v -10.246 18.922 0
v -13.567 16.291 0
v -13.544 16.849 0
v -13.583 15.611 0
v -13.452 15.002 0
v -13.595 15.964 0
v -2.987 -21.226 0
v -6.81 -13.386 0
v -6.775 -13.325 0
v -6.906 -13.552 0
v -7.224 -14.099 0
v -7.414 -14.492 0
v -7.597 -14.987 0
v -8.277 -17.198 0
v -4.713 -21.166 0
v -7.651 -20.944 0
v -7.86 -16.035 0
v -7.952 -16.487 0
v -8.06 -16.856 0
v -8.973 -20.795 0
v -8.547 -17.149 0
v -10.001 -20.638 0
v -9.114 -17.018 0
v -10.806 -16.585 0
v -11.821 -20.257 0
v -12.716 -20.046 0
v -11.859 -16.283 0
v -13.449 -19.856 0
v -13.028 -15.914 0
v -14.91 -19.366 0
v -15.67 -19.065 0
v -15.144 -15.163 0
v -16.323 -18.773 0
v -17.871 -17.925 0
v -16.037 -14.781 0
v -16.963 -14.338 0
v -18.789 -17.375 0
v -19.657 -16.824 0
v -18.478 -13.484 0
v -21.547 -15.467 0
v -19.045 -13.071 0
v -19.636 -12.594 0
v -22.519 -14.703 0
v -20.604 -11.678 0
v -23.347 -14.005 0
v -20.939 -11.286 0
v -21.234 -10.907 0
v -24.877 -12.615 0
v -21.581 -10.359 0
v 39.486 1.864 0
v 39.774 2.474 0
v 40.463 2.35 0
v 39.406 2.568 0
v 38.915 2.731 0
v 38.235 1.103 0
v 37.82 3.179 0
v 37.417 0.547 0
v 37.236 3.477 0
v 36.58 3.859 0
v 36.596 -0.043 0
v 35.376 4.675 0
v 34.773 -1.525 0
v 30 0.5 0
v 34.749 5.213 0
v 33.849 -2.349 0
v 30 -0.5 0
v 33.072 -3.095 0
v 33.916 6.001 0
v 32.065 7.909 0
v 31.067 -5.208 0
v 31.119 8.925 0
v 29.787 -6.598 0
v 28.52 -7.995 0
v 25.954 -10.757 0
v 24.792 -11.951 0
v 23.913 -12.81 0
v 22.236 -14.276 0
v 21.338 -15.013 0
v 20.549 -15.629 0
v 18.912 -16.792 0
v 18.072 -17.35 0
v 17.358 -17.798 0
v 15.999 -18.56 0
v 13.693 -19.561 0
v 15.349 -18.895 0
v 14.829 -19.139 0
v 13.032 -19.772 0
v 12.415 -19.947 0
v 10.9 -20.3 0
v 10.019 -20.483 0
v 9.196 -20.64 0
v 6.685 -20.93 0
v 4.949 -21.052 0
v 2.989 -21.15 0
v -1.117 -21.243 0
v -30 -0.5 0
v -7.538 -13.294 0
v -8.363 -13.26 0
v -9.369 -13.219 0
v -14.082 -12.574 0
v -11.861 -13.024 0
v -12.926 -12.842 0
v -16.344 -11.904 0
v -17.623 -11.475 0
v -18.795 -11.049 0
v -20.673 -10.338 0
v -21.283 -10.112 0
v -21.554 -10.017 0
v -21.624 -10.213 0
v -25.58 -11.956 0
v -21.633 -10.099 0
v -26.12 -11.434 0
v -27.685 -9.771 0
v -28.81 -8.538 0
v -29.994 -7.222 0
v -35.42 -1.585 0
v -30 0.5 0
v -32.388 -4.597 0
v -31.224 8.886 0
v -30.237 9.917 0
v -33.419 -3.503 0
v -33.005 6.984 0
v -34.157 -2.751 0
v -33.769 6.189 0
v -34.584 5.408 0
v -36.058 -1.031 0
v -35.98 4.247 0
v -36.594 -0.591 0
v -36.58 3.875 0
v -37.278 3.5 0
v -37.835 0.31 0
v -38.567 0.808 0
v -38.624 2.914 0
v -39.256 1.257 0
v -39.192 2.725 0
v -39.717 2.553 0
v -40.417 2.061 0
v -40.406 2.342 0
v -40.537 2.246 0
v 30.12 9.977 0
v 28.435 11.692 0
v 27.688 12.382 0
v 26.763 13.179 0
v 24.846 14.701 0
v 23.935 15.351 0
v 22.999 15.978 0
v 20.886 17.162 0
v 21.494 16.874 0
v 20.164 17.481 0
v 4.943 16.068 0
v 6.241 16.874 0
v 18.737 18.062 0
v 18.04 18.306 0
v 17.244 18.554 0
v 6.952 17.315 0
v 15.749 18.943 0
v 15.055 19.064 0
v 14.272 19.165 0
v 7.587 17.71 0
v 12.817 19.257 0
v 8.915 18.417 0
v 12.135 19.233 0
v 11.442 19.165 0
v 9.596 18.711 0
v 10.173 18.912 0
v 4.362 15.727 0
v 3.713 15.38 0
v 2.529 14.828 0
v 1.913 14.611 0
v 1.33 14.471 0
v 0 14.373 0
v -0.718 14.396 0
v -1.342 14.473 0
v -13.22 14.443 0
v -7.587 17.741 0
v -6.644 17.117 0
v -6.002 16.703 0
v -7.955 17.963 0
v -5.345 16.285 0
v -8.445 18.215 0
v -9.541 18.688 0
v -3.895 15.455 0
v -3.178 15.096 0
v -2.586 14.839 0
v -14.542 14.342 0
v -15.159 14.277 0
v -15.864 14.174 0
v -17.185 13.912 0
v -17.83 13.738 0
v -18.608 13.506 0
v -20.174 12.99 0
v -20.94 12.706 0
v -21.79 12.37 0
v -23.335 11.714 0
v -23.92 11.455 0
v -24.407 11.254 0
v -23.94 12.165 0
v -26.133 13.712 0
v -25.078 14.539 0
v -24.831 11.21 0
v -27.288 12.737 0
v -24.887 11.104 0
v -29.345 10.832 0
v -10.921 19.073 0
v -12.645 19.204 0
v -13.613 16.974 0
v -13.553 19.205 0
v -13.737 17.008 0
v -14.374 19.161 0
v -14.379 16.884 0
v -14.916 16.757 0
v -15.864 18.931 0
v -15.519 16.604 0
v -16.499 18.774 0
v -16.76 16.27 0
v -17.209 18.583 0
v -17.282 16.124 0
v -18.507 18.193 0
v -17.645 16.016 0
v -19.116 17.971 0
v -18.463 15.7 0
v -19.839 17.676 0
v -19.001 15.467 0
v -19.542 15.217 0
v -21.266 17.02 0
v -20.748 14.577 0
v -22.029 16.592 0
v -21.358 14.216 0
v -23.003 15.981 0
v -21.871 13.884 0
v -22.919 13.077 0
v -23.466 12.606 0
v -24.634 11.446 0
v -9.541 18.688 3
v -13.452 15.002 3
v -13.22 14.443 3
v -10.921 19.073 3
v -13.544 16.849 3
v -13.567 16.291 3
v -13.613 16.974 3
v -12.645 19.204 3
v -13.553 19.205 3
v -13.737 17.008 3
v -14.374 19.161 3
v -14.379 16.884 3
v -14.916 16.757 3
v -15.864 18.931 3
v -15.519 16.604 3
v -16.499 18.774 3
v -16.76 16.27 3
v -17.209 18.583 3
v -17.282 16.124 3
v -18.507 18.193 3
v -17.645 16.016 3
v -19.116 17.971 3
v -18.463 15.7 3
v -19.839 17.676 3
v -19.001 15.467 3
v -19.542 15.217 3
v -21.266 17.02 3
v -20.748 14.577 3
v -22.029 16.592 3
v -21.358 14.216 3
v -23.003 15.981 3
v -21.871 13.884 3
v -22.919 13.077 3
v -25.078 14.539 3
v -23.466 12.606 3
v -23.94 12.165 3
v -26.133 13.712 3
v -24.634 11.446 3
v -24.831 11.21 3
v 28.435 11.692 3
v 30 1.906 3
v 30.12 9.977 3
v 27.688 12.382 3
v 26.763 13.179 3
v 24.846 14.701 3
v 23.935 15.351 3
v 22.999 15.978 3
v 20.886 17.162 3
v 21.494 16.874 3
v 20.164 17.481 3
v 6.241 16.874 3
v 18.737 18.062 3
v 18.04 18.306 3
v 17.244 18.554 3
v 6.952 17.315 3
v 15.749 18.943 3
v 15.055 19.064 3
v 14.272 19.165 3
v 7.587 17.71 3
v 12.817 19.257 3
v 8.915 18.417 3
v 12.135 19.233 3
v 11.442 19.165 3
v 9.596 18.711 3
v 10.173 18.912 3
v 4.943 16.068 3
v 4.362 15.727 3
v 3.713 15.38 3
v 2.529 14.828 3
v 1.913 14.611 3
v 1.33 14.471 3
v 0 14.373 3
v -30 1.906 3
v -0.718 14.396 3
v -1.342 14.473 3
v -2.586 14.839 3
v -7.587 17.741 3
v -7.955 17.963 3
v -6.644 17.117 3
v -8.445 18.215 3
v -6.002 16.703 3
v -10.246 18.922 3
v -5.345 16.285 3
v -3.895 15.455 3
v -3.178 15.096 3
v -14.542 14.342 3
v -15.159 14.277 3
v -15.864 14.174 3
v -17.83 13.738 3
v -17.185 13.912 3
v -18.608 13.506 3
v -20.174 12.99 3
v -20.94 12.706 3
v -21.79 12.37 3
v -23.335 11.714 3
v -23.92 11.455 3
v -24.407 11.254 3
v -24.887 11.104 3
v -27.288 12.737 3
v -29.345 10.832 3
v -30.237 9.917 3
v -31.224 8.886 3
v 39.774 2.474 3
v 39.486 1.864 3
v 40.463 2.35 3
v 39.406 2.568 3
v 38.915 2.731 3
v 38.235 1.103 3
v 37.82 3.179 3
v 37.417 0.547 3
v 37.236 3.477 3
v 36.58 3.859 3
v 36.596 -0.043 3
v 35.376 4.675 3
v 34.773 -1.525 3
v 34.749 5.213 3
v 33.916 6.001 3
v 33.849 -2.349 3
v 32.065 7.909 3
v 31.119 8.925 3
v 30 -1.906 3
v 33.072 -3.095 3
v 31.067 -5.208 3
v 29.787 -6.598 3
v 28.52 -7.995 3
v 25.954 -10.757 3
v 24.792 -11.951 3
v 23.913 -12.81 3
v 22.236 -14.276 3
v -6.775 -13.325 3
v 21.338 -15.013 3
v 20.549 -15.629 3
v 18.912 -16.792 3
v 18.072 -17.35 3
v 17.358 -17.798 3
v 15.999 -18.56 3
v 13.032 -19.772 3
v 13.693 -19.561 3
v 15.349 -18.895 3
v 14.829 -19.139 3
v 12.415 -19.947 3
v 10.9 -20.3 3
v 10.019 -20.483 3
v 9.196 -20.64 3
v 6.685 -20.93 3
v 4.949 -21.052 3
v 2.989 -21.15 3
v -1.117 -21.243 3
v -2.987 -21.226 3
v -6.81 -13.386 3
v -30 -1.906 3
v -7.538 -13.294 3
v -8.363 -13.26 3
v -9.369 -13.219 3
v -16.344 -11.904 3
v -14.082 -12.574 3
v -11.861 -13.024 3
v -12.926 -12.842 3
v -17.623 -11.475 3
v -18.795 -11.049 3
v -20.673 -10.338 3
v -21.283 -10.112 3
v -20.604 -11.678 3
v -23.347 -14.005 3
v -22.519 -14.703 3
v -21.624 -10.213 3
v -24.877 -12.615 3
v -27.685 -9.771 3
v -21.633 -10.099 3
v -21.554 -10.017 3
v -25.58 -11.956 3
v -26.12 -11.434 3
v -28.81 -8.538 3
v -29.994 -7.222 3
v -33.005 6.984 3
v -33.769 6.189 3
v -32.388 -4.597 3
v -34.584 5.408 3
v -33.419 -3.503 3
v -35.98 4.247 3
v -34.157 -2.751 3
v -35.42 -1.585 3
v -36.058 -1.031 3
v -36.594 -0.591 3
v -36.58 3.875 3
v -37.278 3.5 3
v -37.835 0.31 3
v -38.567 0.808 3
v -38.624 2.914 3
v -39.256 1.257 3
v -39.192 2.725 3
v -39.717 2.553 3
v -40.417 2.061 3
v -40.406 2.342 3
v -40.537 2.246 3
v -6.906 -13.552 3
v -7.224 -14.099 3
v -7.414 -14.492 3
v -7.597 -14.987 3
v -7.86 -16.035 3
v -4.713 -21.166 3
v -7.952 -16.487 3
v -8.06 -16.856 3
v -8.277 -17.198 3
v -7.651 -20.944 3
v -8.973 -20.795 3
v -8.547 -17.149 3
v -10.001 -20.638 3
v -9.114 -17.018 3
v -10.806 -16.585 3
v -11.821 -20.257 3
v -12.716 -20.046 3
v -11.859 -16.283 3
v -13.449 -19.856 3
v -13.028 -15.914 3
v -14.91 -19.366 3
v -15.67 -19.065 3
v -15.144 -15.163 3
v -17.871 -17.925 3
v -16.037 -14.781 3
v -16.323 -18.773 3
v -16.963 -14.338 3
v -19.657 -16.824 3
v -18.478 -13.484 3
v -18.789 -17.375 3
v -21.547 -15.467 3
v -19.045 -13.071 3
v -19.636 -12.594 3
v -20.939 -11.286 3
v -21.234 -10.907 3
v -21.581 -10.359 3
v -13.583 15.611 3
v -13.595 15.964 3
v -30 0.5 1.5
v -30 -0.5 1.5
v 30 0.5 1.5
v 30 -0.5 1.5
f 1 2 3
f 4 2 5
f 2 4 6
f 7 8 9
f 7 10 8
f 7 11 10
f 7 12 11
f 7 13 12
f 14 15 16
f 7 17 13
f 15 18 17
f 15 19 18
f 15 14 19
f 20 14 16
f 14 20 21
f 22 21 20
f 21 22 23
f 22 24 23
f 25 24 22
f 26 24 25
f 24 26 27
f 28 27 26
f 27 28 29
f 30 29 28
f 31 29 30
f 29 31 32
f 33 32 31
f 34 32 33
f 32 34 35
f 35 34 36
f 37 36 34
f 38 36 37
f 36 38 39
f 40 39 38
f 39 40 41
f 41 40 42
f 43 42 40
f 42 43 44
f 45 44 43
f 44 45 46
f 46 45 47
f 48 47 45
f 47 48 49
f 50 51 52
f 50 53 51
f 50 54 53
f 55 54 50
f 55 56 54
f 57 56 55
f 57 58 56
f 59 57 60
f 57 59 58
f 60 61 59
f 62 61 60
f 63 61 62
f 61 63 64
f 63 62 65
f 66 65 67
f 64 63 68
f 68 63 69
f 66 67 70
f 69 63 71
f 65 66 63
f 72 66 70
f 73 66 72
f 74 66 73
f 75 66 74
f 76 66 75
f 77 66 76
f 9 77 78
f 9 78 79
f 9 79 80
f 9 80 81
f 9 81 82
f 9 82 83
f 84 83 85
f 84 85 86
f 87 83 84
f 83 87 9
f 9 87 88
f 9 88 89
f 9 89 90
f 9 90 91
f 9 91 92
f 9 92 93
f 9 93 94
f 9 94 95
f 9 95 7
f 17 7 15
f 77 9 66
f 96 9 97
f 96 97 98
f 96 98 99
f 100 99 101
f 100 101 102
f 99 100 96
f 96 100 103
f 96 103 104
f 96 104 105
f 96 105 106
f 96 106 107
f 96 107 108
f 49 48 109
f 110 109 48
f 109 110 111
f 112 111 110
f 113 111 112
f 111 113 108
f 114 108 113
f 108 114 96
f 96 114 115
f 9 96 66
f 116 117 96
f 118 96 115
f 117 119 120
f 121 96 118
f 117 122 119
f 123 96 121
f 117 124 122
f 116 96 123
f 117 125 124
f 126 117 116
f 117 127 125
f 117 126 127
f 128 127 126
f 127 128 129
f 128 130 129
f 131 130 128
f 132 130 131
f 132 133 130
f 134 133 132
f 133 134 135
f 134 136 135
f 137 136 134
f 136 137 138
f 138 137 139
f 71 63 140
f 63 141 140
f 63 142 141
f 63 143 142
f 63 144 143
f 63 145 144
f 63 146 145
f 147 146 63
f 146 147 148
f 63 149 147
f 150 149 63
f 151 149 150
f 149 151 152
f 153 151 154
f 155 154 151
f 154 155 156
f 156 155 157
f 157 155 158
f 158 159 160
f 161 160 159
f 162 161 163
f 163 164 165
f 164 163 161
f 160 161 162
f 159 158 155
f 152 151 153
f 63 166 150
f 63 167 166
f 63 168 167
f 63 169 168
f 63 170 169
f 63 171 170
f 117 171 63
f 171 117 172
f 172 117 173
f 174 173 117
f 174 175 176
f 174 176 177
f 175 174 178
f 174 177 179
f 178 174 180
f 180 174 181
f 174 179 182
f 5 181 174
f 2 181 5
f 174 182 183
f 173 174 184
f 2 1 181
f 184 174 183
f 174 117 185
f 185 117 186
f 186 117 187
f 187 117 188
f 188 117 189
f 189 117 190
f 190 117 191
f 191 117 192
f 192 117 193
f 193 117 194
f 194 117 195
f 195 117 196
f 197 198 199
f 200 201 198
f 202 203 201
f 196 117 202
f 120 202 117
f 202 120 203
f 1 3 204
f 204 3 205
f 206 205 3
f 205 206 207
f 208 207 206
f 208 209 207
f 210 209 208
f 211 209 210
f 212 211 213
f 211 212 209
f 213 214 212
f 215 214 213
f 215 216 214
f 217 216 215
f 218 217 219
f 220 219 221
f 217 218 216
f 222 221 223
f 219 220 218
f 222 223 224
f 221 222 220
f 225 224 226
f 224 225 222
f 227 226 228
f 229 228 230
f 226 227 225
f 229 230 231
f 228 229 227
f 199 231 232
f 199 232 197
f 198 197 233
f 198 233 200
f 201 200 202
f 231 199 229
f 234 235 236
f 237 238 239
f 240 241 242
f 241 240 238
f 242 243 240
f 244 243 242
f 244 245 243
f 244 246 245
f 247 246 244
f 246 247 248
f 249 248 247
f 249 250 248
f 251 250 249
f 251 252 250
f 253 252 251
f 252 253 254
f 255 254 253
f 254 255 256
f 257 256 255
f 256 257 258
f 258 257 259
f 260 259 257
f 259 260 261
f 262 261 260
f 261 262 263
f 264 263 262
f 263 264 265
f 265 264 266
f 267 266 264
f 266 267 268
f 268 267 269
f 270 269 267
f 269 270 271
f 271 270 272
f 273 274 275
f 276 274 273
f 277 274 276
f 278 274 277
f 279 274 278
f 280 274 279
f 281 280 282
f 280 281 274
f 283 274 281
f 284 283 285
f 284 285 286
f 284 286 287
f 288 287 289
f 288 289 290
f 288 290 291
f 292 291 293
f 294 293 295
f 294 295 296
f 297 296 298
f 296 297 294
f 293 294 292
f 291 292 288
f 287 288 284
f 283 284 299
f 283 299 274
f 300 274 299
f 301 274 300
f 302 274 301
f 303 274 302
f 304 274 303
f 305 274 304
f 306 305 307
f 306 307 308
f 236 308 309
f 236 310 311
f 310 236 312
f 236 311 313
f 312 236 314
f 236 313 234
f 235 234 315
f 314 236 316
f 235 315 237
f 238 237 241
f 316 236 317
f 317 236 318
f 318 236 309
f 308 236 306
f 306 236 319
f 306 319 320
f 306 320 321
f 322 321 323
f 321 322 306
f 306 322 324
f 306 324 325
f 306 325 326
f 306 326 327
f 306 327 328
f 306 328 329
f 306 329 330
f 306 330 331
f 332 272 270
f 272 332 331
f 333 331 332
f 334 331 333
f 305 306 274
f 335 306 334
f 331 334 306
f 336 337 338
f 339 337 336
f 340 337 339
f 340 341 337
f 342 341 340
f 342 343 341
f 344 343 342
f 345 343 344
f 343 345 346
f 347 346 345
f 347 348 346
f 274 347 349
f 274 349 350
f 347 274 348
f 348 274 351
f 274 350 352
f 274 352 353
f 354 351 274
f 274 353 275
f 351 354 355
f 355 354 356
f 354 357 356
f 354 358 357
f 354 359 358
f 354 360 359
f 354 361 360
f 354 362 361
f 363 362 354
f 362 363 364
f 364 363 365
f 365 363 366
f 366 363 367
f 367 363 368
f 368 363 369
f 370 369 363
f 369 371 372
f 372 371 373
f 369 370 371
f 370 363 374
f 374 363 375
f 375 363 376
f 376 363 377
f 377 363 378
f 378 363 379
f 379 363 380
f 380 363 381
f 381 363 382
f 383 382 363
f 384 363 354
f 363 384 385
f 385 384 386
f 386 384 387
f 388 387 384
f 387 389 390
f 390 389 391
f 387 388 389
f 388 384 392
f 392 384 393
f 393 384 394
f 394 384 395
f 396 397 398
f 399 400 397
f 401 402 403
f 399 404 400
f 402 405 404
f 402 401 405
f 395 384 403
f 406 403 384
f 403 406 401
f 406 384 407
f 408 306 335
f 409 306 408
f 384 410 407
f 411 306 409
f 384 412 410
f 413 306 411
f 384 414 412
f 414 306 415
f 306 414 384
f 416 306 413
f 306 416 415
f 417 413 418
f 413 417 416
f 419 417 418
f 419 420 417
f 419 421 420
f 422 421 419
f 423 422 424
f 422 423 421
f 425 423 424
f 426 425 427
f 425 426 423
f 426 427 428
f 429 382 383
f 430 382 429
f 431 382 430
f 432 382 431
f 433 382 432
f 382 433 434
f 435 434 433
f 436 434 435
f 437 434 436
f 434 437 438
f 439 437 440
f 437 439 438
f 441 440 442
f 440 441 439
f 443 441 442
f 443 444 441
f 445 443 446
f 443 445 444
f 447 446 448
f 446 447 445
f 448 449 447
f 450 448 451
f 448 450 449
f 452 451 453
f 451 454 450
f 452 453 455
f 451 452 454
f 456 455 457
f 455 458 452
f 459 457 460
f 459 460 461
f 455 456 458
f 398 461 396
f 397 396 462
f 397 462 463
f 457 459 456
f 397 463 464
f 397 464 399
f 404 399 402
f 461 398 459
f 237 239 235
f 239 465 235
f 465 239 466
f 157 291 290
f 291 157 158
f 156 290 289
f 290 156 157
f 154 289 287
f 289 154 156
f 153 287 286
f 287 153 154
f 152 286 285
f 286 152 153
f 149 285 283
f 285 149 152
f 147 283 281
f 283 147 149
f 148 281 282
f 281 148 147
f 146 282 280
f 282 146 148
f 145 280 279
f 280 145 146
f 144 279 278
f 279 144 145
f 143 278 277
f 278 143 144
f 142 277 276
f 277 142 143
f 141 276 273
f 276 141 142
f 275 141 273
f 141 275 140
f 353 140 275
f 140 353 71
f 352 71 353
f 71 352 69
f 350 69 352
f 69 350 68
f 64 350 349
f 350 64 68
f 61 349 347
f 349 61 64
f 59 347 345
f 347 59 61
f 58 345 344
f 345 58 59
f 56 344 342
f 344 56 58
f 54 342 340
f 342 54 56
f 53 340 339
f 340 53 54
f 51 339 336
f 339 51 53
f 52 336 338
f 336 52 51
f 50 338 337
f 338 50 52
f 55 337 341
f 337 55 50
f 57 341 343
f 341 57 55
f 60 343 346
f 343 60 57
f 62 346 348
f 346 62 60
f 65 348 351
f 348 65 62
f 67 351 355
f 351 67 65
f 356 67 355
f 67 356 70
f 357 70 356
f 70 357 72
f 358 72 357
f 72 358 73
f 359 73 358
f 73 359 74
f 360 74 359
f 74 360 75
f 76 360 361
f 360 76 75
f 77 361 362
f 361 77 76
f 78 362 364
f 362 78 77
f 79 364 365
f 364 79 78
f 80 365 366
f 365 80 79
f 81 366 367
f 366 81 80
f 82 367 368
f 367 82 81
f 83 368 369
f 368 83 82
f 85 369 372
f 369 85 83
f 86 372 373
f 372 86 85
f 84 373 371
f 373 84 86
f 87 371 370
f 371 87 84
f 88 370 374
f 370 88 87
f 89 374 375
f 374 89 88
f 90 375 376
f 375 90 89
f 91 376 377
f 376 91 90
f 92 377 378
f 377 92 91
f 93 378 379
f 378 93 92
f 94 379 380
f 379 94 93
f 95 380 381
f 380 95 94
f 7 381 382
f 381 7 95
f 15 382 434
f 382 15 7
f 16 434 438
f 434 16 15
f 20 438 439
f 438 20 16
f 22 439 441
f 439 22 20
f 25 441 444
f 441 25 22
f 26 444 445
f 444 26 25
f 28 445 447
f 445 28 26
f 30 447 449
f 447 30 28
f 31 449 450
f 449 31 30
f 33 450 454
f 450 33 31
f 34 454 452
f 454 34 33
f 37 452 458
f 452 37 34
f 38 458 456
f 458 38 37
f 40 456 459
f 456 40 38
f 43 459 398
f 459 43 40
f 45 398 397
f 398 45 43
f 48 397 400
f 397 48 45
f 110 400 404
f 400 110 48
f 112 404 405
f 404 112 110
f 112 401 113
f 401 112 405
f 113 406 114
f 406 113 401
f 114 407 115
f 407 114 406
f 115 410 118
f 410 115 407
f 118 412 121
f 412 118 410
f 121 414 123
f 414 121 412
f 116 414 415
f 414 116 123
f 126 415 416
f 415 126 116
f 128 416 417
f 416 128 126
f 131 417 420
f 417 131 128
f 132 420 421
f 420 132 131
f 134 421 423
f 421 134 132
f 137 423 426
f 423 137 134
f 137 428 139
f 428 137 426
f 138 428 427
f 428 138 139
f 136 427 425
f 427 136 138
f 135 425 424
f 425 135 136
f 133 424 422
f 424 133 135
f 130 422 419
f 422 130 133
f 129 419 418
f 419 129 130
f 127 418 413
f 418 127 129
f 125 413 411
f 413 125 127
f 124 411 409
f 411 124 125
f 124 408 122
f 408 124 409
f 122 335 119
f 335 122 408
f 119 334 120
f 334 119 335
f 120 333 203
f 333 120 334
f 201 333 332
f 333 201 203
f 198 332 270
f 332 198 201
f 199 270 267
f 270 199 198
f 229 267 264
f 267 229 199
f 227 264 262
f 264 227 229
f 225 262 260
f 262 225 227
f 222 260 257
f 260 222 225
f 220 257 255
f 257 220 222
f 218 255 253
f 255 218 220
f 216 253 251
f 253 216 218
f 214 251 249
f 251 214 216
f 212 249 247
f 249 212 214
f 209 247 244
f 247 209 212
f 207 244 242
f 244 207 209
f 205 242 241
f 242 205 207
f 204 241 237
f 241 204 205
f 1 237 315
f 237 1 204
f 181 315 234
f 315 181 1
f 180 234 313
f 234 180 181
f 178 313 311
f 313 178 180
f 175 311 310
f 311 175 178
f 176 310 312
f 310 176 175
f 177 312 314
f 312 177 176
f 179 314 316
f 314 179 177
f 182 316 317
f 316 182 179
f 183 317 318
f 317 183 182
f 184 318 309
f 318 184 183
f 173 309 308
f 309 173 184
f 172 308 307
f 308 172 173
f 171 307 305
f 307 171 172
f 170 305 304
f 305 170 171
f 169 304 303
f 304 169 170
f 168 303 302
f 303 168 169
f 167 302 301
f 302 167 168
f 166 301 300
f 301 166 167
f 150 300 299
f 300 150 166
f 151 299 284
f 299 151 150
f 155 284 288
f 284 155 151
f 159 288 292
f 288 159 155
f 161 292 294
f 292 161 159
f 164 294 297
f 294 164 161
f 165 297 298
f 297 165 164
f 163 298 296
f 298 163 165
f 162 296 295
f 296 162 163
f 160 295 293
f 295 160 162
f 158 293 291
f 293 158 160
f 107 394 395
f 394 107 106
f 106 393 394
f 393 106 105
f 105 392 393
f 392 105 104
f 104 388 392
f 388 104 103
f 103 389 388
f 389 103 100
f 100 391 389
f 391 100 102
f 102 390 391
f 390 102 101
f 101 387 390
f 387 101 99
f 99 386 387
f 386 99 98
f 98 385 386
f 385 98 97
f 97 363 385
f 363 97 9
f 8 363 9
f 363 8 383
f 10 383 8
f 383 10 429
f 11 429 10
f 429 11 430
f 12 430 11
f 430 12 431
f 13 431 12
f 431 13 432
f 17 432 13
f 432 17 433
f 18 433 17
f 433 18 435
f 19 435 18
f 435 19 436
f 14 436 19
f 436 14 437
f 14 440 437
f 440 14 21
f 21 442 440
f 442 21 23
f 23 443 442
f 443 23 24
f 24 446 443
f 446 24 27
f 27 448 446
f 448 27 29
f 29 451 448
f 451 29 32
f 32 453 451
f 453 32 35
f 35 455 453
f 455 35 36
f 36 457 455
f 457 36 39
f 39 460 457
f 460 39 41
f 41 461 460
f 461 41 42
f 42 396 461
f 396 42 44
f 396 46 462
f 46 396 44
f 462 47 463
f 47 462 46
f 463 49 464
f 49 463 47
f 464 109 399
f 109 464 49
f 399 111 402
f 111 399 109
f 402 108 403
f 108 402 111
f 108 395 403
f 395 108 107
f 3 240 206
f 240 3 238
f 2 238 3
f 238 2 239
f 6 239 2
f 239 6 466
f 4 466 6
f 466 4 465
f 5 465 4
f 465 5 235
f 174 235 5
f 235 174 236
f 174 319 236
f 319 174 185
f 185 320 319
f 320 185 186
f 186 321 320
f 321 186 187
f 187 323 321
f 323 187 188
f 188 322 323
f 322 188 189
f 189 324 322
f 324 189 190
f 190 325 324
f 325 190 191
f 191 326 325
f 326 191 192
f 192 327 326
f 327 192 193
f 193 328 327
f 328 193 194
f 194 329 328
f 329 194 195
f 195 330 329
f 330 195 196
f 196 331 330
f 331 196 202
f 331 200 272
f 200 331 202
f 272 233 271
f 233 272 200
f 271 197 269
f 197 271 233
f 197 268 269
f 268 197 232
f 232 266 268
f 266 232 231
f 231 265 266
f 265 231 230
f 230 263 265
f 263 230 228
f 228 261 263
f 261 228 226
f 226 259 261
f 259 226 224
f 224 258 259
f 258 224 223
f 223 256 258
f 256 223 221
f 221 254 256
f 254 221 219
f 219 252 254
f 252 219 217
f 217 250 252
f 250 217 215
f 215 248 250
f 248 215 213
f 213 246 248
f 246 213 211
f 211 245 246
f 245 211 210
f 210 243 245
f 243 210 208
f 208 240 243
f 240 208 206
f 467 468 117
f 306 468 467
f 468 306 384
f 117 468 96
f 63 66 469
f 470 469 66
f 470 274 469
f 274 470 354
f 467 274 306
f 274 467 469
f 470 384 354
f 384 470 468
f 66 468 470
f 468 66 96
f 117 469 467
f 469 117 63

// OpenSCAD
/*
* Toothpaste Dispenser Squeezer - https://www.thingiverse.com/thing:3694757
* by ASP3D - https://www.thingiverse.com/asp3d/about
* created 2019-06-16
* version v1.0
*
* Changelog
* --------------
* v1.0 - 2019-06-16:
* - [new] Initial release
* --------------
*
* This work is licensed under the Creative Commons - Attribution - Non-Commercial ShareAlike license.
* https://creativecommons.org/licenses/by-nc-sa/3.0/
*/


/* [Squeezer] */

// Hole width in millimeters
hole_width = 60; // [30:100]
// Hole height in millimeters
hole_height = 1; // [0.4:0.2:3]

// Squeezer thickness
width = 3; // [1:0.5:8]



/* [Hidden] */

size = 1.35 * hole_width;
height = 0.5 * size;
hole_scale = 1.5;







assembly();


module assembly() {
    difference() {
        lips_3d();
        hole_3d();
    }
}

module hole_3d() {
    translate([-hole_width/2, 0, -0.1])
        rotate([90, 0, 90])
            linear_extrude(hole_width)
                hole_shape();
}

module hole_shape() {
    x1 = hole_height/2;
    x2 = x1 + hole_scale;
    h1 = width + 0.2;
    polygon([ [-x1, 0], [-x1, h1/2], [-x2, h1], [x2, h1], [x1, h1/2], [x1, 0] ]);
}





module lips_3d() {
    resize([size, height, width])
    translate([-421/2, 384/2 + 30, 0])
    mirror([0, 1, 0])
    union()
    difference() {
        lips_main_3d();
        lips_holes_3d();
    }
}

module lips_main_3d() {
    linear_extrude(1)
        lips_main_shape();
}

module lips_holes_3d() {
    translate([0, 0, -1])
    linear_extrude(2)
        lips_holes_shape();
}

module lips_main_shape() {
    polygon([[155.5,110.31],[155.5,110.31],[151.55,110.306],[147.978,110.561],[141.5,111.9],[141.5,111.9],[138.737,112.812],[135.648,113.924],[130,116.19],[130,116.19],[127.354,117.482],[124.21,119.198],[118,123.01],[118,123.01],[114.682,125.503],[110.448,129.055],[101.42,137.44],[101.42,137.44],[96.833,142.252],[91.806,147.923],[82.86,159],[82.86,159],[78.981,164.326],[74.686,170.321],[66.94,181.38],[66.94,181.38],[63.618,186.005],[60.072,190.547],[54,197.3],[54,197.3],[51.393,199.464],[48.355,201.647],[42.5,205.05],[42.5,205.05],[40.031,206.152],[37.747,207.15],[34.75,208.38],[34.75,208.38],[34.182,208.937],[34.703,210.016],[39.75,214.69],[39.75,214.69],[42.75,217.299],[45.933,220.196],[51.33,225.44],[51.33,225.44],[53.662,227.995],[56.438,231.217],[61.93,238],[61.93,238],[65.142,242.374],[69.627,248.735],[80.04,264],[80.04,264],[85.188,271.658],[90.081,278.83],[96.89,288.5],[96.89,288.5],[99.237,291.536],[102.293,295.367],[108.95,303.45],[108.95,303.45],[112.551,307.511],[116.78,311.957],[125,319.85],[125,319.85],[128.775,323.05],[132.767,326.253],[139.5,331.18],[139.5,331.18],[142.343,332.88],[145.648,334.633],[152,337.48],[152,337.48],[155.191,338.587],[159.083,339.815],[167,342.03],[167,342.03],[171.469,342.94],[177.221,343.812],[190,345.1],[190,345.1],[197.506,345.447],[205.64,345.546],[223.5,345.01],[223.5,345.01],[232.027,344.436],[239.579,343.727],[250.5,342.04],[250.5,342.04],[254.079,341.126],[257.912,340.062],[264.5,338.01],[264.5,338.01],[267.184,336.992],[270.057,335.768],[275,333.31],[275,333.31],[277.262,331.89],[280.091,329.946],[286,325.51],[286,325.51],[289.108,322.906],[292.76,319.662],[299.88,312.9],[299.88,312.9],[303.313,309.316],[307.217,305.03],[314.51,296.5],[314.51,296.5],[318.335,291.506],[323.39,284.562],[334.55,268.5],[334.55,268.5],[340.061,260.373],[345.631,252.292],[354.35,240],[354.35,240],[357.731,235.662],[361.748,230.87],[369.68,222.25],[369.68,222.25],[373.247,218.821],[376.805,215.587],[382.25,211.16],[386.5,208.33],[383.5,207.61],[383.5,207.61],[381.901,207.067],[379.767,206.114],[375,203.51],[375,203.51],[372.461,201.776],[369.61,199.557],[364.37,194.81],[364.37,194.81],[361.643,191.683],[358.021,187.096],[349.97,176],[349.97,176],[345.856,170.09],[341.508,163.972],[334.18,154],[334.18,154],[330.933,149.987],[326.907,145.351],[318.57,136.5],[318.57,136.5],[314.607,132.717],[310.537,129.073],[303.99,123.86],[303.99,123.86],[301.345,122.189],[298.205,120.33],[292,116.95],[292,116.95],[288.966,115.532],[285.503,114.093],[279,111.83],[279,111.83],[275.985,111.122],[272.576,110.539],[266.25,110],[266.25,110],[263.283,110.139],[260.267,110.539],[254.75,112.01],[254.75,112.01],[252.237,113.18],[249.278,114.89],[243.5,119],[243.5,119],[240.737,121.295],[237.648,123.861],[232,128.55],[232,128.55],[229.472,130.531],[226.648,132.552],[221.5,135.76],[221.5,135.76],[218.819,137.022],[216.285,137.838],[210.5,138.41],[210.5,138.41],[207.379,138.276],[204.661,137.827],[199.25,135.7],[199.25,135.7],[196.677,134.203],[193.557,132.117],[187.25,127.29],[187.25,127.29],[184.393,124.855],[181.602,122.447],[177.5,118.82],[177.5,118.82],[175.901,117.53],[173.767,116.061],[169,113.31],[169,113.31],[165.935,111.951],[162.996,111.071],[155.5,110.31]]);
}

module lips_holes_shape() {
    polygon([[150.75,123.08],[150.75,123.08],[151.291,123.28],[151.588,124.006],[151.49,127.25],[151.49,127.25],[151.367,129.157],[151.421,131.206],[151.99,134.75],[153,138],[147.25,138.59],[147.25,138.59],[144.564,138.967],[141.5,139.566],[135.75,141.09],[135.75,141.09],[132.946,142.103],[129.561,143.451],[122.75,146.45],[122.75,146.45],[119.421,148.104],[115.721,150.055],[109,153.87],[109,153.87],[106.458,155.376],[104.338,156.548],[102.25,157.42],[102.25,157.42],[102.495,156.803],[103.353,155.433],[106.37,151.25],[106.37,151.25],[108.43,148.683],[110.813,145.942],[115.37,141.25],[115.37,141.25],[117.599,139.323],[120.255,137.221],[125.5,133.5],[125.5,133.5],[127.854,132.047],[130.195,130.687],[133.75,128.85],[133.75,128.85],[135.33,128.225],[137.602,127.372],[143,125.43],[143,125.43],[145.62,124.541],[147.955,123.801],[150.75,123.08]]);
    polygon([[116.75,280.26],[116.75,280.26],[117.927,280.812],[120.582,282.127],[128.75,286.26],[128.75,286.26],[133.848,288.737],[139.412,291.235],[149.25,295.13],[149.25,295.13],[154.277,296.686],[158.911,297.747],[169.75,298.88],[169.75,298.88],[174.126,299.12],[177.711,299.317],[181.03,299.5],[181.03,299.5],[180.881,299.854],[180.463,300.82],[179.08,304],[179.08,304],[178.253,306.282],[177.454,309.165],[176.31,315.26],[176.31,315.26],[175.914,317.885],[175.442,320.035],[174.5,322.02],[174.5,322.02],[173.322,321.739],[170.856,320.975],[163.5,318.46],[163.5,318.46],[158.917,316.7],[153.832,314.557],[144.63,310.19],[144.63,310.19],[140.745,307.968],[136.716,305.387],[130.13,300.42],[130.13,300.42],[127.66,298.022],[125.092,295.245],[120.88,289.92],[120.88,289.92],[119.425,287.638],[118.14,285.432],[116.63,282.25],[116.63,282.25],[116.443,281.396],[116.405,280.737],[116.75,280.26]]);
}
